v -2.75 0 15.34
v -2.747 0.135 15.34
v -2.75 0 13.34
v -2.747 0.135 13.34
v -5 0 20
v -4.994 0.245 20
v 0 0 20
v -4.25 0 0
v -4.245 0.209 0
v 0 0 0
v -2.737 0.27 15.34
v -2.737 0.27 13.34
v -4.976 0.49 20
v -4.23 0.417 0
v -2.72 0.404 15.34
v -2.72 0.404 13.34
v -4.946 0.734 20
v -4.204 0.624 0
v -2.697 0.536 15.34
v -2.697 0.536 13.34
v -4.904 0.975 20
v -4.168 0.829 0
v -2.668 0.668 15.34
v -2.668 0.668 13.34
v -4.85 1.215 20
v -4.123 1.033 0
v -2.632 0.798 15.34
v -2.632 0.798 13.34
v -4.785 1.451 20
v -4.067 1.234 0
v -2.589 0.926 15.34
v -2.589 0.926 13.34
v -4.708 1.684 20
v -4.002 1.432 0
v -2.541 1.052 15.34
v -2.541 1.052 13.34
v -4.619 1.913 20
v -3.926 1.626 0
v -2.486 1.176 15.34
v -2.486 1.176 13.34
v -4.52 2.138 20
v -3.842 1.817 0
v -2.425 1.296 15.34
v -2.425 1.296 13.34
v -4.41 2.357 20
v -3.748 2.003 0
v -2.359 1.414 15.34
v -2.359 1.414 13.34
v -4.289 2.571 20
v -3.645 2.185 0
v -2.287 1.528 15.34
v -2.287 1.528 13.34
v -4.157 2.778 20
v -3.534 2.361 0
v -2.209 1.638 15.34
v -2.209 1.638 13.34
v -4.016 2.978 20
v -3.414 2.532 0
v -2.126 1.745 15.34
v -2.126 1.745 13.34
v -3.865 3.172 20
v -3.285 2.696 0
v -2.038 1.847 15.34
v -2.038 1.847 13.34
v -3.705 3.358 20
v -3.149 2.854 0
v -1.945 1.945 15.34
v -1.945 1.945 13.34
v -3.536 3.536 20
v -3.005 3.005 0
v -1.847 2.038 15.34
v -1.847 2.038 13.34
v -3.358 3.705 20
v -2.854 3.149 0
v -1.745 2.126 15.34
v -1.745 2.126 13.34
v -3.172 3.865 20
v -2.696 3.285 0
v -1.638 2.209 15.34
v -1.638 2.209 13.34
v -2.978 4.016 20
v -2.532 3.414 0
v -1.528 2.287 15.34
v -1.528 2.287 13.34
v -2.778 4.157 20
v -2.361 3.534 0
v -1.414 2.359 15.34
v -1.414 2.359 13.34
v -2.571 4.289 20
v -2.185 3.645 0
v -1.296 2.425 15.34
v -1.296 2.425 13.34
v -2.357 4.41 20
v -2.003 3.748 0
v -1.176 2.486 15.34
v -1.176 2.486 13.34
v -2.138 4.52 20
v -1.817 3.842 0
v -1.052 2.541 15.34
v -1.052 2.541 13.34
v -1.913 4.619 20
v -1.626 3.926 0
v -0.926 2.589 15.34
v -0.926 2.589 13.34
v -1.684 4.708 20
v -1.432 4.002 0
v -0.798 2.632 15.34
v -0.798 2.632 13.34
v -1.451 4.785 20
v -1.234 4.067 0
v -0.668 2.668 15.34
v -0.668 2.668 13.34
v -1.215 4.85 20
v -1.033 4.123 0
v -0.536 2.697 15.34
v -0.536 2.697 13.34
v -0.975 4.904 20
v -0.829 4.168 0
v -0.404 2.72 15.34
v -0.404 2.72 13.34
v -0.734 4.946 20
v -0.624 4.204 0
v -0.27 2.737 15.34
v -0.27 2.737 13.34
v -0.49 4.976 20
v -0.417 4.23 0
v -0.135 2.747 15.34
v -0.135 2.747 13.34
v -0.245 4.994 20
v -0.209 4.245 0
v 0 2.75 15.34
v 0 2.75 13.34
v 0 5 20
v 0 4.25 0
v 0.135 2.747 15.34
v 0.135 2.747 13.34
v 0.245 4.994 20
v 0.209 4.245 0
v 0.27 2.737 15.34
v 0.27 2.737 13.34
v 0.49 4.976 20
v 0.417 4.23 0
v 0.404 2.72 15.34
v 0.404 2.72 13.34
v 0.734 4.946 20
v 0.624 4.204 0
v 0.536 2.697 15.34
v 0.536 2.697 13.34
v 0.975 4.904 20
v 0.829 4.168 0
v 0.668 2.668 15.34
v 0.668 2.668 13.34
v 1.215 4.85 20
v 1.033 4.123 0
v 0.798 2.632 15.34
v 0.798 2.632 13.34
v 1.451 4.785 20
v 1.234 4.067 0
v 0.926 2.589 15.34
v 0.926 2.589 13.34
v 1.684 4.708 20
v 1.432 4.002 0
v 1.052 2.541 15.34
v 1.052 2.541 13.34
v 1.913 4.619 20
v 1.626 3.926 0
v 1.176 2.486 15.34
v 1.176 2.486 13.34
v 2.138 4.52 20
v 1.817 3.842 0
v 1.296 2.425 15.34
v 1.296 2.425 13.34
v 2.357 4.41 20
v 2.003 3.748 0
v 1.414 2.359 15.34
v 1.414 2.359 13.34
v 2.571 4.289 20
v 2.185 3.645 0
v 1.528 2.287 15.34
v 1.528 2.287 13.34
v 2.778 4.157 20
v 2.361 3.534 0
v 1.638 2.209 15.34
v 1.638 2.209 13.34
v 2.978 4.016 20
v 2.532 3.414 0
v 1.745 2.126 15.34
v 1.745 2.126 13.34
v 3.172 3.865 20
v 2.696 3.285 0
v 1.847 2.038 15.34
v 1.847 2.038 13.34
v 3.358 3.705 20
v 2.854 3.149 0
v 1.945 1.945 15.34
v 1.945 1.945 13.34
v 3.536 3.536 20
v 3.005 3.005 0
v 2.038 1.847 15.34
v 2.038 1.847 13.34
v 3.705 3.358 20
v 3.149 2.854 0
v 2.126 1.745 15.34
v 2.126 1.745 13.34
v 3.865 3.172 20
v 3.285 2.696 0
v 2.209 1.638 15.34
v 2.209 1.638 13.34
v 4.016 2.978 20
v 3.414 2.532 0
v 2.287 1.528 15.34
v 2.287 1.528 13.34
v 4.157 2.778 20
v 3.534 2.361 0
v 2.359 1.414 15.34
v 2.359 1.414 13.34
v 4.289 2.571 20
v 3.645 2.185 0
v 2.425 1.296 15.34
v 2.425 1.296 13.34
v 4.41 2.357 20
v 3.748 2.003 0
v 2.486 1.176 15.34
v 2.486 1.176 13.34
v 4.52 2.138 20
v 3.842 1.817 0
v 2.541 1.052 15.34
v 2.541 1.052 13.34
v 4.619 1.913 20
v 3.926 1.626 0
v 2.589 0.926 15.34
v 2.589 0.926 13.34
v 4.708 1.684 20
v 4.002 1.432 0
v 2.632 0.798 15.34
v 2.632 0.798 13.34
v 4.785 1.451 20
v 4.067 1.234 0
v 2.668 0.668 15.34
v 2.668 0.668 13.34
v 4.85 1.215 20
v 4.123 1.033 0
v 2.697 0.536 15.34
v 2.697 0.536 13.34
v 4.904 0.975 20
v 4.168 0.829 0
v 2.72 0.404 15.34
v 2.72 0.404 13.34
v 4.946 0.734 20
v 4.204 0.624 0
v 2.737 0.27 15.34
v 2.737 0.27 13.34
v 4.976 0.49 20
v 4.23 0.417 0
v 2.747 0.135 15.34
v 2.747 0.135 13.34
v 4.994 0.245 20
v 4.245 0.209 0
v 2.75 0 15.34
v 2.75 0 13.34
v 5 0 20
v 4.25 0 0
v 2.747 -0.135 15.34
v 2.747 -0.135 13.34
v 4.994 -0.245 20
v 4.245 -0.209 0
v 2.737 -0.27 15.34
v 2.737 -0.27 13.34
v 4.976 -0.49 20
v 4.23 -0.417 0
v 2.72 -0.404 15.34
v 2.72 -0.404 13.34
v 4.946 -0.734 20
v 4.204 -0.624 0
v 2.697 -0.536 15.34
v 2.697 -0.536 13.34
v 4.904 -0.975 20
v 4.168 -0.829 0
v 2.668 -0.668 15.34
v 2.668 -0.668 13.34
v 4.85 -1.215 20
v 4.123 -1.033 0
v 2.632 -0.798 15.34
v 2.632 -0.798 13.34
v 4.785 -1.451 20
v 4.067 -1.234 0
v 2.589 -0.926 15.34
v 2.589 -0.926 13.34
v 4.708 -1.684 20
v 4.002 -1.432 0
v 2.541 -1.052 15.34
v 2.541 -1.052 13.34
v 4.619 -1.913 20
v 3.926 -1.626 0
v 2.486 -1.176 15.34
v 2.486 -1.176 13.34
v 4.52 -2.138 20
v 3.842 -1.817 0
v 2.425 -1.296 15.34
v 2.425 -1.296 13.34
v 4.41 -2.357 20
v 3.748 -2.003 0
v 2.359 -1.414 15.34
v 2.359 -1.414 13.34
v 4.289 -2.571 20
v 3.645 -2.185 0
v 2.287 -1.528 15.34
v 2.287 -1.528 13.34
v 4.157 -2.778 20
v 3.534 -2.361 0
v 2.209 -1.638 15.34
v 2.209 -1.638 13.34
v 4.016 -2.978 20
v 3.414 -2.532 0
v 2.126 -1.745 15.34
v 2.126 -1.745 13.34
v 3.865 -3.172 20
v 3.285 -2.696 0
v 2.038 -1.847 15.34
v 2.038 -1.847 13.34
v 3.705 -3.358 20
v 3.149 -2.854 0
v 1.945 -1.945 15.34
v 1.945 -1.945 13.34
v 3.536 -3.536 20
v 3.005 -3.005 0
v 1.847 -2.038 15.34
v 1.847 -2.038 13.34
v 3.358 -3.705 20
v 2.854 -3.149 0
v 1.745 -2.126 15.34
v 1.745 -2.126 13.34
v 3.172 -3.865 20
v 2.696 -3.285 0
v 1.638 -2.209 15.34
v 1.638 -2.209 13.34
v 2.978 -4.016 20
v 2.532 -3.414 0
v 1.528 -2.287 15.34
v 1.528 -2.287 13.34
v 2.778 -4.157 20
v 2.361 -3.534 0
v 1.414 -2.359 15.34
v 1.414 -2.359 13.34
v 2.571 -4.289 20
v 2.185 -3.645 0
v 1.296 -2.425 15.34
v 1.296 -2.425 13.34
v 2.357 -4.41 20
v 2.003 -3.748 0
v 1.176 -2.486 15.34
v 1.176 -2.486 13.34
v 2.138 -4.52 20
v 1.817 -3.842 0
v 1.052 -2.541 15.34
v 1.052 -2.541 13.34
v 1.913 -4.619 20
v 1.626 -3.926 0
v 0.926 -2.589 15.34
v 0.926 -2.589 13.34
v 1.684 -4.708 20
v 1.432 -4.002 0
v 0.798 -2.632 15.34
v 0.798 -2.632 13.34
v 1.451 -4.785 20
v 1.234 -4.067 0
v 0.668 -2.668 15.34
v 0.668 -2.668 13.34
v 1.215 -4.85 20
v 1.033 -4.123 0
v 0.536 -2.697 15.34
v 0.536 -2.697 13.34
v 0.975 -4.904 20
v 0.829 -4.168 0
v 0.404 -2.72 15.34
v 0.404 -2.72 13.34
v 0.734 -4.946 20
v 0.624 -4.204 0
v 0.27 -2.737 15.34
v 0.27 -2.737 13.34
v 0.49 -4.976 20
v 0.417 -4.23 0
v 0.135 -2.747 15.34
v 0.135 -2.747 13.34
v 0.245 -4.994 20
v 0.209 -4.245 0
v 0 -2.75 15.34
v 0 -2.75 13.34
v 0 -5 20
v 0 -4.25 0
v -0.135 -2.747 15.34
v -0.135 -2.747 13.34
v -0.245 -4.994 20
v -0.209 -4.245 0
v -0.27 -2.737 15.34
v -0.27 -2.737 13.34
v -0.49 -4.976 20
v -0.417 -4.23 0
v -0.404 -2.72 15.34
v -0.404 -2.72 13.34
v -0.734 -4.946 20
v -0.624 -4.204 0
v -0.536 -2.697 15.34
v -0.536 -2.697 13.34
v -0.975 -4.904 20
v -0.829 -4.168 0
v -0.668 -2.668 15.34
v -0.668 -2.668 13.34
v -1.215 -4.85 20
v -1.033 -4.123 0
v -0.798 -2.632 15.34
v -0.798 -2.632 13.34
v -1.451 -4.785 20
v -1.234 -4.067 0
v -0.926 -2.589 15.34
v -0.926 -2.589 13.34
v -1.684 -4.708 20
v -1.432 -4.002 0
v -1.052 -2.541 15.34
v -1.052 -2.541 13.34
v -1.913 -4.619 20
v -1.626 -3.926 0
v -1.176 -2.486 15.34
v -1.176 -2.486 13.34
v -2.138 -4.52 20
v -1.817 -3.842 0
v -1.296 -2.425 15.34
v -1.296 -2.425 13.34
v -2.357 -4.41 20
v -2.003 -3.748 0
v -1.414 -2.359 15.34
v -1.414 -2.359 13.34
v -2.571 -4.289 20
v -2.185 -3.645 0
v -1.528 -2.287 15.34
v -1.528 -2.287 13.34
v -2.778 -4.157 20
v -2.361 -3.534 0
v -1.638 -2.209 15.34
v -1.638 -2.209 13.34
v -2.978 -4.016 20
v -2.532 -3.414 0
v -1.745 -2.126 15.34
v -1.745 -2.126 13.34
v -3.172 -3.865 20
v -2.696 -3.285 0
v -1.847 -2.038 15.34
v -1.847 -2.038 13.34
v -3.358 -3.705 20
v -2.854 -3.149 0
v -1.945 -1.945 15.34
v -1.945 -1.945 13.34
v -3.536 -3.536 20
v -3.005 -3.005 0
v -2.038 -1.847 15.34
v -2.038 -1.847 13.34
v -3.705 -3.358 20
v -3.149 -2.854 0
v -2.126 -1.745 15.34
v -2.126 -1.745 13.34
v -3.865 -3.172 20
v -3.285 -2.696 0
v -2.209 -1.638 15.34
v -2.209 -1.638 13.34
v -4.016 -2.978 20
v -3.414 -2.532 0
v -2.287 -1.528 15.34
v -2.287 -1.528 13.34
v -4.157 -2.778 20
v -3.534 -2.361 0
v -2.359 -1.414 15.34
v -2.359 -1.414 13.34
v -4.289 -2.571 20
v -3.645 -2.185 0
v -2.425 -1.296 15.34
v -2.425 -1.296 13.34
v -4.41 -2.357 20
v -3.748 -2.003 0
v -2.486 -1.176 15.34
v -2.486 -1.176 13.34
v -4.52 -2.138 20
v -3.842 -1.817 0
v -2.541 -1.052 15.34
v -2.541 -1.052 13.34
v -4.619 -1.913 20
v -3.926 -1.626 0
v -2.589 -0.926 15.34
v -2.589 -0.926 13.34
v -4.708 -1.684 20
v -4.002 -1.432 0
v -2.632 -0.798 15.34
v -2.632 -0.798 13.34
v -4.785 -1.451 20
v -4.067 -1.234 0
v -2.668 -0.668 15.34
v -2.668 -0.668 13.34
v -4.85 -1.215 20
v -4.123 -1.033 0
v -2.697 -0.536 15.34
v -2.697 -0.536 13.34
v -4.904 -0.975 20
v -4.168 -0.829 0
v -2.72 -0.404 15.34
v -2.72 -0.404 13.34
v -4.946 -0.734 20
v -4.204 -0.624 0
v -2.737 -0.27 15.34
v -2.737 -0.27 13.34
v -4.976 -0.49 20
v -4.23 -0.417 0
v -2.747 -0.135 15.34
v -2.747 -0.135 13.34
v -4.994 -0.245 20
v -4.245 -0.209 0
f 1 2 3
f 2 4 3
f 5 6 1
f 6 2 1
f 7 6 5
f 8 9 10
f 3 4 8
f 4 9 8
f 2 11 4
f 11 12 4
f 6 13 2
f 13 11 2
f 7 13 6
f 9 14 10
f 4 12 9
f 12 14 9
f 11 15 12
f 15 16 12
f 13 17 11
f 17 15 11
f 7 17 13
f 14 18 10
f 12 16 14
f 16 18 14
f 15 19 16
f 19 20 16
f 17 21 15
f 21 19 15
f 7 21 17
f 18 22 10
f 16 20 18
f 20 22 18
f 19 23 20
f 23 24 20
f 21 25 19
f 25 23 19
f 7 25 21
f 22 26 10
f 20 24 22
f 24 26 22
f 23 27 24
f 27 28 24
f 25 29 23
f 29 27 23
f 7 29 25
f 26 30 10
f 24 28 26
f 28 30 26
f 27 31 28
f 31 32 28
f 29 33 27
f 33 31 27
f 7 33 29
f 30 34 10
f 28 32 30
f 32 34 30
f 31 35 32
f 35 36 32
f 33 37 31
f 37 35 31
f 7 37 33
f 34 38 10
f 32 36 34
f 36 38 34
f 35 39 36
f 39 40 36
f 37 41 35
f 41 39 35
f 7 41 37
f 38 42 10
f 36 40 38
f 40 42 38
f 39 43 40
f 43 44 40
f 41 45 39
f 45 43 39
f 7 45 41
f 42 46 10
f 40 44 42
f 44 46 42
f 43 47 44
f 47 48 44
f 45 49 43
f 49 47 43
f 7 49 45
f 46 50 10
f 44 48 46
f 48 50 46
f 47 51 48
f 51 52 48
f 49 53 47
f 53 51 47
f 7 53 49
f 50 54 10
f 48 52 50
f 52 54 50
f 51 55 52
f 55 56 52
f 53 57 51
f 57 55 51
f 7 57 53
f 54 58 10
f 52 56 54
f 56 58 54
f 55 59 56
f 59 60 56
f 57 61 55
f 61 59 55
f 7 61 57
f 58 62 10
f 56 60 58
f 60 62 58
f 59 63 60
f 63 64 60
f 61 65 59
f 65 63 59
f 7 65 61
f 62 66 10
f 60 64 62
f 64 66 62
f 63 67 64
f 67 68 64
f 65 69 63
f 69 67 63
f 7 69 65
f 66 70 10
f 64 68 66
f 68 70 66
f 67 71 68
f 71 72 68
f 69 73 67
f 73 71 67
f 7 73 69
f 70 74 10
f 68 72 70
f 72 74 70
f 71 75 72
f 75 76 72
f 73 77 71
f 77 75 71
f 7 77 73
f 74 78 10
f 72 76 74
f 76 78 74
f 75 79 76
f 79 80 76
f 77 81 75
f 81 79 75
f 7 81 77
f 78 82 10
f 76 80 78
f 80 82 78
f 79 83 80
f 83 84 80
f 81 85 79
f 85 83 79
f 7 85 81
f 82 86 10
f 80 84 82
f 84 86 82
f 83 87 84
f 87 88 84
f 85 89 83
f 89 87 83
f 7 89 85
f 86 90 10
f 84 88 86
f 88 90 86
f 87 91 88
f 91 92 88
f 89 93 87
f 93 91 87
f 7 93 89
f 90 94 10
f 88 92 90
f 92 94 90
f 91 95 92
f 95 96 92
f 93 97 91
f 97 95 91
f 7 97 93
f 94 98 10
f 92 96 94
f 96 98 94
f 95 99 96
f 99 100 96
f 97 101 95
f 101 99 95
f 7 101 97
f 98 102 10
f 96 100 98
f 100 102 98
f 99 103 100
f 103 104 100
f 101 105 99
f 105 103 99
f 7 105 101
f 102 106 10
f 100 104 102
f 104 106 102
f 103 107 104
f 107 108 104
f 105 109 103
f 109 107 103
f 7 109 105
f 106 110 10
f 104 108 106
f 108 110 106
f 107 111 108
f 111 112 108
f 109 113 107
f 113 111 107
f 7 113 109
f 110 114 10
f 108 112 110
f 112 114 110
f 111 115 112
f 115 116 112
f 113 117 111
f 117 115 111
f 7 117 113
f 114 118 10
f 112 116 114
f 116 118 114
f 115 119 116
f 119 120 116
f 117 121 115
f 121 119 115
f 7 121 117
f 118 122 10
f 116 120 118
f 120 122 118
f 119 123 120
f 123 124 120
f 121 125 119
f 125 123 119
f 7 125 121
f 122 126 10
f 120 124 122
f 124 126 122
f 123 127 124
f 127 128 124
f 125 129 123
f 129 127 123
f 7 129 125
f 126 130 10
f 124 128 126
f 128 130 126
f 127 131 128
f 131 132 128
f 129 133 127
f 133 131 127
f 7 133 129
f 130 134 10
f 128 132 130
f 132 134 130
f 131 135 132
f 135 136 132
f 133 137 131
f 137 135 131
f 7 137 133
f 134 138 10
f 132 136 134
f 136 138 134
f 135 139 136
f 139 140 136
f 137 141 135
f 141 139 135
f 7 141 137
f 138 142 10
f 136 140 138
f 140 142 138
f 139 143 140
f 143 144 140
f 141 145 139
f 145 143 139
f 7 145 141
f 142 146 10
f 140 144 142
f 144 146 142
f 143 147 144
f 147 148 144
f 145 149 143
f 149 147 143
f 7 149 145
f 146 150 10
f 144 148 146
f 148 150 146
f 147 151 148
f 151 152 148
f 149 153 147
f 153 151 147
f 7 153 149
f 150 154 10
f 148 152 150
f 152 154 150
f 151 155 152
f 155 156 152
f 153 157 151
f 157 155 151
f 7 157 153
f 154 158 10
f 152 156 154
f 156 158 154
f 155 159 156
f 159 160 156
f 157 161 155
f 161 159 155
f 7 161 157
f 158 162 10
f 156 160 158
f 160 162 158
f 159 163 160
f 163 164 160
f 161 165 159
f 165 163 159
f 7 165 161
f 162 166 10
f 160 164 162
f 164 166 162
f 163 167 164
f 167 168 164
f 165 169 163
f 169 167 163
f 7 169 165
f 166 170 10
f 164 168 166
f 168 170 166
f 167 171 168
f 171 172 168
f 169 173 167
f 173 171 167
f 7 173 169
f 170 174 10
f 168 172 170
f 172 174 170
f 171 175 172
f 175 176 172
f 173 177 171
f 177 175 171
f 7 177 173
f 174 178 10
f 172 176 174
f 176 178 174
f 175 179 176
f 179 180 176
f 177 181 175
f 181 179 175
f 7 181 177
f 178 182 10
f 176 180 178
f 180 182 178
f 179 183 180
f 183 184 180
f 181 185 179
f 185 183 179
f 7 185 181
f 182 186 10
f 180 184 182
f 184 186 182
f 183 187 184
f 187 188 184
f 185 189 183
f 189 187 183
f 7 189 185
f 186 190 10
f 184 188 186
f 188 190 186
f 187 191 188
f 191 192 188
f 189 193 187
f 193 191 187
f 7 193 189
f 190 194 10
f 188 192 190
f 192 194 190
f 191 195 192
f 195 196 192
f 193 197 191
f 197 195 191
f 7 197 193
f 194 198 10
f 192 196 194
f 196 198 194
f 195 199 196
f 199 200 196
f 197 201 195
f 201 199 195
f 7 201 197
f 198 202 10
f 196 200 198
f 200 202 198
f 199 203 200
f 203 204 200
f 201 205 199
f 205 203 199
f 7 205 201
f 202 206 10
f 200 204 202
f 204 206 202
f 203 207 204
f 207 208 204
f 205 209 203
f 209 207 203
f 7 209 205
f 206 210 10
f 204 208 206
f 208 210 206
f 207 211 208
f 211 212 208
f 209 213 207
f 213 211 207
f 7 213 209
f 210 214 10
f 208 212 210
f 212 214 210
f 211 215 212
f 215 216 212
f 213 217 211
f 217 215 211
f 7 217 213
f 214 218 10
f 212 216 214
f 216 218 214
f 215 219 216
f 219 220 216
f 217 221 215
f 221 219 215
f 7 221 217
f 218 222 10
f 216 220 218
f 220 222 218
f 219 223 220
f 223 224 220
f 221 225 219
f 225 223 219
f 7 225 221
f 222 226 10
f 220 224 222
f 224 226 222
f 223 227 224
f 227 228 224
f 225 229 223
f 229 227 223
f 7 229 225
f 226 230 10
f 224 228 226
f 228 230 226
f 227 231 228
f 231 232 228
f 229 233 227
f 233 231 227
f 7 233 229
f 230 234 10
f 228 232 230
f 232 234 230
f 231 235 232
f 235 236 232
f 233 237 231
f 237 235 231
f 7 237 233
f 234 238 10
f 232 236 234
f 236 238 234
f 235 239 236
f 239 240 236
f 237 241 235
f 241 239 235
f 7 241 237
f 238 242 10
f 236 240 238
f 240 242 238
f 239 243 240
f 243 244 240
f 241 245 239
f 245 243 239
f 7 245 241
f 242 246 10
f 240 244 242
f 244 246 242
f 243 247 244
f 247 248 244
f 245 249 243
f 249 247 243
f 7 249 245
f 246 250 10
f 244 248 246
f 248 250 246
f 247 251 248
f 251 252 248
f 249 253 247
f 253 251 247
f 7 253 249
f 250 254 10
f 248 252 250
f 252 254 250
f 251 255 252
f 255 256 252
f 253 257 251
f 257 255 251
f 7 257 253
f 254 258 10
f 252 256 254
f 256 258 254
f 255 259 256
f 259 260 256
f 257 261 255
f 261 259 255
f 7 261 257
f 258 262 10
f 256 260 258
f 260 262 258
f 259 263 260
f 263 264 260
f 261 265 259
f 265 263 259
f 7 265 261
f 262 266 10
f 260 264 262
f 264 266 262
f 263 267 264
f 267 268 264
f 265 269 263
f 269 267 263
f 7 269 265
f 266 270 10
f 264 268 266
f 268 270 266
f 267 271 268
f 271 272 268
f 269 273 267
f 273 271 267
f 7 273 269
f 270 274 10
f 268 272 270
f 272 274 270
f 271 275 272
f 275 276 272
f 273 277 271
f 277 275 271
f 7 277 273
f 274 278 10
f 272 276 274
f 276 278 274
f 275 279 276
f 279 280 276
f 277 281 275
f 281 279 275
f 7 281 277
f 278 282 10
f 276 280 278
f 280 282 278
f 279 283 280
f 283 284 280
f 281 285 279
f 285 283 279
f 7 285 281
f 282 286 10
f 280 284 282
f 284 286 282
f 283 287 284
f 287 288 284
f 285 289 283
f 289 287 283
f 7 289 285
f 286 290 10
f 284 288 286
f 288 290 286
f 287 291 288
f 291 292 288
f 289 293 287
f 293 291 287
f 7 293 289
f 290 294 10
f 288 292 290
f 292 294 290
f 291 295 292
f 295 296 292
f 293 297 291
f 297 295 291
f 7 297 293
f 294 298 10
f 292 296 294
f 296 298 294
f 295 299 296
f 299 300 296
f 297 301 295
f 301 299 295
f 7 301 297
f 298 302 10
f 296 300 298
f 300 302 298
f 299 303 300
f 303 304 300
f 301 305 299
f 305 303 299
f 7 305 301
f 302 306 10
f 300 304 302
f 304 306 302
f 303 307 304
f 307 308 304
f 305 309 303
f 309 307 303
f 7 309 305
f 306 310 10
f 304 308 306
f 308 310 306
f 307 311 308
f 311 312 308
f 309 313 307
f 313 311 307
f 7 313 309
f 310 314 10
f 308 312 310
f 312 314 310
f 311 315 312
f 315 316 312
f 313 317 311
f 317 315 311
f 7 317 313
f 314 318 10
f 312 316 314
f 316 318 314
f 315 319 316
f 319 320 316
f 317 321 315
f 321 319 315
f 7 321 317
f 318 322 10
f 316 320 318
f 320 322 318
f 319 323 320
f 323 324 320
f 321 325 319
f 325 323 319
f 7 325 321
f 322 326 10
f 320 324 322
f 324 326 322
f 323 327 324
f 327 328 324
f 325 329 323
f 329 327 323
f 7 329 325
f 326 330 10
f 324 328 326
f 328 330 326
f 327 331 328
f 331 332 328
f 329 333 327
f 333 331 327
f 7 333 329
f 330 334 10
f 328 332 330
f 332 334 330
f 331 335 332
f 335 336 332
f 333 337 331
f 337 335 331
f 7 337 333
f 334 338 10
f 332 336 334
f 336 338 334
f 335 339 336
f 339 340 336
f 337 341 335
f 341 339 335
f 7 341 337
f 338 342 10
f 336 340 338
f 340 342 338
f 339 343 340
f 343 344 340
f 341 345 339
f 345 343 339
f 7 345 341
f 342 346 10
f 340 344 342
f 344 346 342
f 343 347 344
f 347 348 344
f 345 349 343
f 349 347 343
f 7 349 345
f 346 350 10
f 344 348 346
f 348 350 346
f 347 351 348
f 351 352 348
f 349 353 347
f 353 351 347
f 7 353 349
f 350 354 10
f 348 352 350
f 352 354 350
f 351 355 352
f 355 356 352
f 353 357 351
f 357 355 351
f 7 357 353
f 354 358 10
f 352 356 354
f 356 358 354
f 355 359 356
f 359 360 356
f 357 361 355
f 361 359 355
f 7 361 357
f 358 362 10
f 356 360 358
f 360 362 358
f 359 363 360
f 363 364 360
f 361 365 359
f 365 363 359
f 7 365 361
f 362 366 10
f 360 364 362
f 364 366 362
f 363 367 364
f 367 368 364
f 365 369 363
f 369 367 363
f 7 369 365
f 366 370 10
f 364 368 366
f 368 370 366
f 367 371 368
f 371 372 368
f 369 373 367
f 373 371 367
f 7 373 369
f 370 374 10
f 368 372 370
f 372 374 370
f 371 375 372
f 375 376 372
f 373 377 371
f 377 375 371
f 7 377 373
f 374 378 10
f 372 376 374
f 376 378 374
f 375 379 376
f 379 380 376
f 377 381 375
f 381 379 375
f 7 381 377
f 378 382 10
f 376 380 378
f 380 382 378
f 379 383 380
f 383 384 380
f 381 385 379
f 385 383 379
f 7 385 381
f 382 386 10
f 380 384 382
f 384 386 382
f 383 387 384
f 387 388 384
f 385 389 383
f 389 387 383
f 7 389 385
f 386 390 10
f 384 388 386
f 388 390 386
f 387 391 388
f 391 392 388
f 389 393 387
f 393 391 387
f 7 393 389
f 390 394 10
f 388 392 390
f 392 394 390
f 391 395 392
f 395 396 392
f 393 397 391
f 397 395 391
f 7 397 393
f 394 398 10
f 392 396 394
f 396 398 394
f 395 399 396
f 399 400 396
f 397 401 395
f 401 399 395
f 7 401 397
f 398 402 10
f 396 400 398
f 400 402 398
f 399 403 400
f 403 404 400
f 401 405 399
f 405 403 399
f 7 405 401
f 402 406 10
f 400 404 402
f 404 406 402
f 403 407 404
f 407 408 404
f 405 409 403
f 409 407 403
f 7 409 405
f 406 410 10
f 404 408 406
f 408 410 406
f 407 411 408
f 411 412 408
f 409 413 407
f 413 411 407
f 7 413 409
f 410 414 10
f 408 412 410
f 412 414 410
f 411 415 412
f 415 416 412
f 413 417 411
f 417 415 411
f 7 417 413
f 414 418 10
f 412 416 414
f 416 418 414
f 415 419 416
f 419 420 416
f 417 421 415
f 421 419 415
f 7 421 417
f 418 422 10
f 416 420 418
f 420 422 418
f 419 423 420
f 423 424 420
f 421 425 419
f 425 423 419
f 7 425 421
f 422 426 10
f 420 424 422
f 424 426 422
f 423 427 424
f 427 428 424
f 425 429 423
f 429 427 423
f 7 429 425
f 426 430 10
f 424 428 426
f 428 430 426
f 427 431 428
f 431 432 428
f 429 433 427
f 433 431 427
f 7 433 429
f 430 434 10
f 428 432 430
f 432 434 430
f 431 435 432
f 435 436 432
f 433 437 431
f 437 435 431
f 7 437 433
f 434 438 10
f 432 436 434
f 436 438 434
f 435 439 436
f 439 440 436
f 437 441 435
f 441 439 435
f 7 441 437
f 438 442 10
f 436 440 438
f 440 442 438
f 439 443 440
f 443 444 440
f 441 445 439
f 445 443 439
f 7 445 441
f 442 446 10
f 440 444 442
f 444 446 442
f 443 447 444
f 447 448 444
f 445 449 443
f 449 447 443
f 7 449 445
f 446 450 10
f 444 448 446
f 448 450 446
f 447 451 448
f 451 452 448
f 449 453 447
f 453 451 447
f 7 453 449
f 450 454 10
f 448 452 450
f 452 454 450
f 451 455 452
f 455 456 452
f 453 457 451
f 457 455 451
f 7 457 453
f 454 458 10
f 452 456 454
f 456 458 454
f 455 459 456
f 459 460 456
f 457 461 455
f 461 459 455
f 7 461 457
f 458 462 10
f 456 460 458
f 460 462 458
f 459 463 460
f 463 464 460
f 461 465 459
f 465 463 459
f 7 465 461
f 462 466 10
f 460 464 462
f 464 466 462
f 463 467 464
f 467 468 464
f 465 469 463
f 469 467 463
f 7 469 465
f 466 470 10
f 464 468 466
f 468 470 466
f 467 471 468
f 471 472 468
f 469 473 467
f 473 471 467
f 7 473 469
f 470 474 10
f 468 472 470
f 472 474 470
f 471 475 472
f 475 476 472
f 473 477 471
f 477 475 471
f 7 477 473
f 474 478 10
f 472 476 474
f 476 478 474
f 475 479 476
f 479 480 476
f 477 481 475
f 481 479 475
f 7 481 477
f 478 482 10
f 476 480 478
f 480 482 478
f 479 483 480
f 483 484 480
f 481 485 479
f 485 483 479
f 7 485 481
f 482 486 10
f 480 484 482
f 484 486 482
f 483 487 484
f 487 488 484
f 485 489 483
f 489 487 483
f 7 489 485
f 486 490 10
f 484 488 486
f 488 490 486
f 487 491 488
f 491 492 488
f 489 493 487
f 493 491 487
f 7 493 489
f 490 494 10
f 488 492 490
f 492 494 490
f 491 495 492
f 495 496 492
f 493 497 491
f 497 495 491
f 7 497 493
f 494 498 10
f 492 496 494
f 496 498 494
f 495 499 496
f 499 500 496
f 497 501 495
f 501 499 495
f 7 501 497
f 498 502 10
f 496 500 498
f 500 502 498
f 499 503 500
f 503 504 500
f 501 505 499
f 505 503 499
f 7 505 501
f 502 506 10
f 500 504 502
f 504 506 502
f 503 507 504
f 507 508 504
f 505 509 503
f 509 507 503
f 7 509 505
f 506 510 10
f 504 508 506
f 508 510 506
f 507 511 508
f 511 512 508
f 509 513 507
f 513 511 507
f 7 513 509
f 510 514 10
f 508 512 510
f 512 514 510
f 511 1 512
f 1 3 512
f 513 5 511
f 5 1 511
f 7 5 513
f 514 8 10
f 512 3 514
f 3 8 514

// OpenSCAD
// Djembe goblet-body parametric master — outer envelope only.
//
// tonykoop/djembe
// Authority: pending_measurement. NOT fabrication authority until reviewed
// against a measured template (see visual-output-register.csv CAD-001 and
// validation.csv DJM-VAL-004 / DJM-VAL-006 gates).
//
// Dimension source (do not edit values without updating the source record):
//   - head/neck/foot diameters, neck z-window, and total height are read
//     verbatim from CAD/djembe-body/parametric-goblet.csv (Morgan Drums
//     S/M/L profiles; also summarized in README.md "Acoustics research —
//     bass-tone analysis" and wolfram/djembe-goblet-acoustics.wl).
//   - z is measured DOWNWARD from the head rim (z=0 at head, z=total_height
//     at foot), matching parametric-goblet.csv's own convention
//     (neck_length_in = z_neck_bot_in - z_neck_top_in).
//   - neck cross-section area (the CSV's neck_area_in2 column) is
//     recomputed below from neck_diameter_in as an in-file self-check,
//     never re-entered by hand.
//
// Explicitly OUT OF SCOPE here (measurement_required / hand-refined
// geometry per risks.md and drawing-brief.md — this master does not fake
// any of it):
//   - shell wall thickness / hollow interior. No thickness value exists in
//     bom.csv or cut-list.csv (both TBD); this master models the OUTER
//     envelope solid only, not a hollow shell.
//   - stave layout, miter angles, Approach A/B/C construction geometry
//     (see README.md "The engineering challenge") — belongs in CAD/stave/
//     once that geometry is reviewed.
//   - jig / fixture geometry — belongs in CAD/jigs/ once populated.
//   - bearing-edge profile, head/rim/rope tensioning hardware — measurement
//     required per validation.csv DJM-VAL-005 / DJM-VAL-007.
//
// Units: inches.

/* [Variant] */
// 0 = S (Morgan-9, small), 1 = M (Morgan-10, medium), 2 = L (Morgan-12, large)
variant = 1;

/* [Design table -- CAD/djembe-body/parametric-goblet.csv, verbatim] */
profile_label     = ["S -- Morgan-9 (small)", "M -- Morgan-10 (medium)", "L -- Morgan-12 (large)"];
head_dia_in       = [9.0000, 10.0000, 12.0000];
neck_dia_in       = [5.0000, 5.5000, 6.5000];
foot_dia_in       = [8.0000, 8.5000, 10.0000];
total_height_in   = [18.0000, 20.0000, 24.0000];
z_neck_top_in     = [4.1000, 4.6600, 10.1200];   // head-rim to top-of-neck, measured downward
z_neck_bot_in     = [6.1000, 6.6600, 12.6200];   // head-rim to bottom-of-neck, measured downward
neck_area_ref_in2 = [19.6350, 23.7583, 33.1831]; // csv column; self-check only, see below

/* [Active profile, derived from the design table] */
head_r = head_dia_in[variant] / 2;
neck_r = neck_dia_in[variant] / 2;
foot_r = foot_dia_in[variant] / 2;
height = total_height_in[variant];
z_top  = z_neck_top_in[variant];
z_bot  = z_neck_bot_in[variant];

// ---------------------------------------------------------------------------
// Self-check: recompute the neck cross-section area from neck_dia_in and
// diff it against the CSV's neck_area_in2 column. This just echoes at
// render time (OpenSCAD has no assert-and-continue); a nonzero diff means
// the design table and this master have drifted and need reconciling.
// ---------------------------------------------------------------------------
computed_neck_area_in2 = PI * pow(neck_r, 2);
echo(str("djembe.scad variant: ", profile_label[variant]));
echo(str("neck_area_in2 self-check -- computed=", computed_neck_area_in2,
         " csv=", neck_area_ref_in2[variant],
         " diff=", computed_neck_area_in2 - neck_area_ref_in2[variant]));

// ---------------------------------------------------------------------------
// Goblet outer-envelope profile: (radius, y) points where y is measured
// UPWARD from the foot (y=0) to the head rim (y=height), i.e. y = height-z.
// This is fed straight into rotate_extrude(), which revolves the 2D X axis
// as radius and the 2D Y axis as the extrusion/height axis around Z.
// Six points only -- foot axis, foot rim, bottom-of-neck, top-of-neck, head
// rim, head axis. No curvature is invented between the design-table points.
// ---------------------------------------------------------------------------
function goblet_profile() = [
  [0,      0],                // foot, on-axis
  [foot_r, 0],                // foot rim
  [neck_r, height - z_bot],   // bottom of neck (straight run starts)
  [neck_r, height - z_top],   // top of neck (straight run ends)
  [head_r, height],           // head rim
  [0,      height],           // head, on-axis
];

module goblet_shell_envelope(fn = 128) {
  rotate_extrude(angle = 360, $fn = fn)
    polygon(points = goblet_profile());
}

module djembe_assembly() {
  goblet_shell_envelope();
}

djembe_assembly();
